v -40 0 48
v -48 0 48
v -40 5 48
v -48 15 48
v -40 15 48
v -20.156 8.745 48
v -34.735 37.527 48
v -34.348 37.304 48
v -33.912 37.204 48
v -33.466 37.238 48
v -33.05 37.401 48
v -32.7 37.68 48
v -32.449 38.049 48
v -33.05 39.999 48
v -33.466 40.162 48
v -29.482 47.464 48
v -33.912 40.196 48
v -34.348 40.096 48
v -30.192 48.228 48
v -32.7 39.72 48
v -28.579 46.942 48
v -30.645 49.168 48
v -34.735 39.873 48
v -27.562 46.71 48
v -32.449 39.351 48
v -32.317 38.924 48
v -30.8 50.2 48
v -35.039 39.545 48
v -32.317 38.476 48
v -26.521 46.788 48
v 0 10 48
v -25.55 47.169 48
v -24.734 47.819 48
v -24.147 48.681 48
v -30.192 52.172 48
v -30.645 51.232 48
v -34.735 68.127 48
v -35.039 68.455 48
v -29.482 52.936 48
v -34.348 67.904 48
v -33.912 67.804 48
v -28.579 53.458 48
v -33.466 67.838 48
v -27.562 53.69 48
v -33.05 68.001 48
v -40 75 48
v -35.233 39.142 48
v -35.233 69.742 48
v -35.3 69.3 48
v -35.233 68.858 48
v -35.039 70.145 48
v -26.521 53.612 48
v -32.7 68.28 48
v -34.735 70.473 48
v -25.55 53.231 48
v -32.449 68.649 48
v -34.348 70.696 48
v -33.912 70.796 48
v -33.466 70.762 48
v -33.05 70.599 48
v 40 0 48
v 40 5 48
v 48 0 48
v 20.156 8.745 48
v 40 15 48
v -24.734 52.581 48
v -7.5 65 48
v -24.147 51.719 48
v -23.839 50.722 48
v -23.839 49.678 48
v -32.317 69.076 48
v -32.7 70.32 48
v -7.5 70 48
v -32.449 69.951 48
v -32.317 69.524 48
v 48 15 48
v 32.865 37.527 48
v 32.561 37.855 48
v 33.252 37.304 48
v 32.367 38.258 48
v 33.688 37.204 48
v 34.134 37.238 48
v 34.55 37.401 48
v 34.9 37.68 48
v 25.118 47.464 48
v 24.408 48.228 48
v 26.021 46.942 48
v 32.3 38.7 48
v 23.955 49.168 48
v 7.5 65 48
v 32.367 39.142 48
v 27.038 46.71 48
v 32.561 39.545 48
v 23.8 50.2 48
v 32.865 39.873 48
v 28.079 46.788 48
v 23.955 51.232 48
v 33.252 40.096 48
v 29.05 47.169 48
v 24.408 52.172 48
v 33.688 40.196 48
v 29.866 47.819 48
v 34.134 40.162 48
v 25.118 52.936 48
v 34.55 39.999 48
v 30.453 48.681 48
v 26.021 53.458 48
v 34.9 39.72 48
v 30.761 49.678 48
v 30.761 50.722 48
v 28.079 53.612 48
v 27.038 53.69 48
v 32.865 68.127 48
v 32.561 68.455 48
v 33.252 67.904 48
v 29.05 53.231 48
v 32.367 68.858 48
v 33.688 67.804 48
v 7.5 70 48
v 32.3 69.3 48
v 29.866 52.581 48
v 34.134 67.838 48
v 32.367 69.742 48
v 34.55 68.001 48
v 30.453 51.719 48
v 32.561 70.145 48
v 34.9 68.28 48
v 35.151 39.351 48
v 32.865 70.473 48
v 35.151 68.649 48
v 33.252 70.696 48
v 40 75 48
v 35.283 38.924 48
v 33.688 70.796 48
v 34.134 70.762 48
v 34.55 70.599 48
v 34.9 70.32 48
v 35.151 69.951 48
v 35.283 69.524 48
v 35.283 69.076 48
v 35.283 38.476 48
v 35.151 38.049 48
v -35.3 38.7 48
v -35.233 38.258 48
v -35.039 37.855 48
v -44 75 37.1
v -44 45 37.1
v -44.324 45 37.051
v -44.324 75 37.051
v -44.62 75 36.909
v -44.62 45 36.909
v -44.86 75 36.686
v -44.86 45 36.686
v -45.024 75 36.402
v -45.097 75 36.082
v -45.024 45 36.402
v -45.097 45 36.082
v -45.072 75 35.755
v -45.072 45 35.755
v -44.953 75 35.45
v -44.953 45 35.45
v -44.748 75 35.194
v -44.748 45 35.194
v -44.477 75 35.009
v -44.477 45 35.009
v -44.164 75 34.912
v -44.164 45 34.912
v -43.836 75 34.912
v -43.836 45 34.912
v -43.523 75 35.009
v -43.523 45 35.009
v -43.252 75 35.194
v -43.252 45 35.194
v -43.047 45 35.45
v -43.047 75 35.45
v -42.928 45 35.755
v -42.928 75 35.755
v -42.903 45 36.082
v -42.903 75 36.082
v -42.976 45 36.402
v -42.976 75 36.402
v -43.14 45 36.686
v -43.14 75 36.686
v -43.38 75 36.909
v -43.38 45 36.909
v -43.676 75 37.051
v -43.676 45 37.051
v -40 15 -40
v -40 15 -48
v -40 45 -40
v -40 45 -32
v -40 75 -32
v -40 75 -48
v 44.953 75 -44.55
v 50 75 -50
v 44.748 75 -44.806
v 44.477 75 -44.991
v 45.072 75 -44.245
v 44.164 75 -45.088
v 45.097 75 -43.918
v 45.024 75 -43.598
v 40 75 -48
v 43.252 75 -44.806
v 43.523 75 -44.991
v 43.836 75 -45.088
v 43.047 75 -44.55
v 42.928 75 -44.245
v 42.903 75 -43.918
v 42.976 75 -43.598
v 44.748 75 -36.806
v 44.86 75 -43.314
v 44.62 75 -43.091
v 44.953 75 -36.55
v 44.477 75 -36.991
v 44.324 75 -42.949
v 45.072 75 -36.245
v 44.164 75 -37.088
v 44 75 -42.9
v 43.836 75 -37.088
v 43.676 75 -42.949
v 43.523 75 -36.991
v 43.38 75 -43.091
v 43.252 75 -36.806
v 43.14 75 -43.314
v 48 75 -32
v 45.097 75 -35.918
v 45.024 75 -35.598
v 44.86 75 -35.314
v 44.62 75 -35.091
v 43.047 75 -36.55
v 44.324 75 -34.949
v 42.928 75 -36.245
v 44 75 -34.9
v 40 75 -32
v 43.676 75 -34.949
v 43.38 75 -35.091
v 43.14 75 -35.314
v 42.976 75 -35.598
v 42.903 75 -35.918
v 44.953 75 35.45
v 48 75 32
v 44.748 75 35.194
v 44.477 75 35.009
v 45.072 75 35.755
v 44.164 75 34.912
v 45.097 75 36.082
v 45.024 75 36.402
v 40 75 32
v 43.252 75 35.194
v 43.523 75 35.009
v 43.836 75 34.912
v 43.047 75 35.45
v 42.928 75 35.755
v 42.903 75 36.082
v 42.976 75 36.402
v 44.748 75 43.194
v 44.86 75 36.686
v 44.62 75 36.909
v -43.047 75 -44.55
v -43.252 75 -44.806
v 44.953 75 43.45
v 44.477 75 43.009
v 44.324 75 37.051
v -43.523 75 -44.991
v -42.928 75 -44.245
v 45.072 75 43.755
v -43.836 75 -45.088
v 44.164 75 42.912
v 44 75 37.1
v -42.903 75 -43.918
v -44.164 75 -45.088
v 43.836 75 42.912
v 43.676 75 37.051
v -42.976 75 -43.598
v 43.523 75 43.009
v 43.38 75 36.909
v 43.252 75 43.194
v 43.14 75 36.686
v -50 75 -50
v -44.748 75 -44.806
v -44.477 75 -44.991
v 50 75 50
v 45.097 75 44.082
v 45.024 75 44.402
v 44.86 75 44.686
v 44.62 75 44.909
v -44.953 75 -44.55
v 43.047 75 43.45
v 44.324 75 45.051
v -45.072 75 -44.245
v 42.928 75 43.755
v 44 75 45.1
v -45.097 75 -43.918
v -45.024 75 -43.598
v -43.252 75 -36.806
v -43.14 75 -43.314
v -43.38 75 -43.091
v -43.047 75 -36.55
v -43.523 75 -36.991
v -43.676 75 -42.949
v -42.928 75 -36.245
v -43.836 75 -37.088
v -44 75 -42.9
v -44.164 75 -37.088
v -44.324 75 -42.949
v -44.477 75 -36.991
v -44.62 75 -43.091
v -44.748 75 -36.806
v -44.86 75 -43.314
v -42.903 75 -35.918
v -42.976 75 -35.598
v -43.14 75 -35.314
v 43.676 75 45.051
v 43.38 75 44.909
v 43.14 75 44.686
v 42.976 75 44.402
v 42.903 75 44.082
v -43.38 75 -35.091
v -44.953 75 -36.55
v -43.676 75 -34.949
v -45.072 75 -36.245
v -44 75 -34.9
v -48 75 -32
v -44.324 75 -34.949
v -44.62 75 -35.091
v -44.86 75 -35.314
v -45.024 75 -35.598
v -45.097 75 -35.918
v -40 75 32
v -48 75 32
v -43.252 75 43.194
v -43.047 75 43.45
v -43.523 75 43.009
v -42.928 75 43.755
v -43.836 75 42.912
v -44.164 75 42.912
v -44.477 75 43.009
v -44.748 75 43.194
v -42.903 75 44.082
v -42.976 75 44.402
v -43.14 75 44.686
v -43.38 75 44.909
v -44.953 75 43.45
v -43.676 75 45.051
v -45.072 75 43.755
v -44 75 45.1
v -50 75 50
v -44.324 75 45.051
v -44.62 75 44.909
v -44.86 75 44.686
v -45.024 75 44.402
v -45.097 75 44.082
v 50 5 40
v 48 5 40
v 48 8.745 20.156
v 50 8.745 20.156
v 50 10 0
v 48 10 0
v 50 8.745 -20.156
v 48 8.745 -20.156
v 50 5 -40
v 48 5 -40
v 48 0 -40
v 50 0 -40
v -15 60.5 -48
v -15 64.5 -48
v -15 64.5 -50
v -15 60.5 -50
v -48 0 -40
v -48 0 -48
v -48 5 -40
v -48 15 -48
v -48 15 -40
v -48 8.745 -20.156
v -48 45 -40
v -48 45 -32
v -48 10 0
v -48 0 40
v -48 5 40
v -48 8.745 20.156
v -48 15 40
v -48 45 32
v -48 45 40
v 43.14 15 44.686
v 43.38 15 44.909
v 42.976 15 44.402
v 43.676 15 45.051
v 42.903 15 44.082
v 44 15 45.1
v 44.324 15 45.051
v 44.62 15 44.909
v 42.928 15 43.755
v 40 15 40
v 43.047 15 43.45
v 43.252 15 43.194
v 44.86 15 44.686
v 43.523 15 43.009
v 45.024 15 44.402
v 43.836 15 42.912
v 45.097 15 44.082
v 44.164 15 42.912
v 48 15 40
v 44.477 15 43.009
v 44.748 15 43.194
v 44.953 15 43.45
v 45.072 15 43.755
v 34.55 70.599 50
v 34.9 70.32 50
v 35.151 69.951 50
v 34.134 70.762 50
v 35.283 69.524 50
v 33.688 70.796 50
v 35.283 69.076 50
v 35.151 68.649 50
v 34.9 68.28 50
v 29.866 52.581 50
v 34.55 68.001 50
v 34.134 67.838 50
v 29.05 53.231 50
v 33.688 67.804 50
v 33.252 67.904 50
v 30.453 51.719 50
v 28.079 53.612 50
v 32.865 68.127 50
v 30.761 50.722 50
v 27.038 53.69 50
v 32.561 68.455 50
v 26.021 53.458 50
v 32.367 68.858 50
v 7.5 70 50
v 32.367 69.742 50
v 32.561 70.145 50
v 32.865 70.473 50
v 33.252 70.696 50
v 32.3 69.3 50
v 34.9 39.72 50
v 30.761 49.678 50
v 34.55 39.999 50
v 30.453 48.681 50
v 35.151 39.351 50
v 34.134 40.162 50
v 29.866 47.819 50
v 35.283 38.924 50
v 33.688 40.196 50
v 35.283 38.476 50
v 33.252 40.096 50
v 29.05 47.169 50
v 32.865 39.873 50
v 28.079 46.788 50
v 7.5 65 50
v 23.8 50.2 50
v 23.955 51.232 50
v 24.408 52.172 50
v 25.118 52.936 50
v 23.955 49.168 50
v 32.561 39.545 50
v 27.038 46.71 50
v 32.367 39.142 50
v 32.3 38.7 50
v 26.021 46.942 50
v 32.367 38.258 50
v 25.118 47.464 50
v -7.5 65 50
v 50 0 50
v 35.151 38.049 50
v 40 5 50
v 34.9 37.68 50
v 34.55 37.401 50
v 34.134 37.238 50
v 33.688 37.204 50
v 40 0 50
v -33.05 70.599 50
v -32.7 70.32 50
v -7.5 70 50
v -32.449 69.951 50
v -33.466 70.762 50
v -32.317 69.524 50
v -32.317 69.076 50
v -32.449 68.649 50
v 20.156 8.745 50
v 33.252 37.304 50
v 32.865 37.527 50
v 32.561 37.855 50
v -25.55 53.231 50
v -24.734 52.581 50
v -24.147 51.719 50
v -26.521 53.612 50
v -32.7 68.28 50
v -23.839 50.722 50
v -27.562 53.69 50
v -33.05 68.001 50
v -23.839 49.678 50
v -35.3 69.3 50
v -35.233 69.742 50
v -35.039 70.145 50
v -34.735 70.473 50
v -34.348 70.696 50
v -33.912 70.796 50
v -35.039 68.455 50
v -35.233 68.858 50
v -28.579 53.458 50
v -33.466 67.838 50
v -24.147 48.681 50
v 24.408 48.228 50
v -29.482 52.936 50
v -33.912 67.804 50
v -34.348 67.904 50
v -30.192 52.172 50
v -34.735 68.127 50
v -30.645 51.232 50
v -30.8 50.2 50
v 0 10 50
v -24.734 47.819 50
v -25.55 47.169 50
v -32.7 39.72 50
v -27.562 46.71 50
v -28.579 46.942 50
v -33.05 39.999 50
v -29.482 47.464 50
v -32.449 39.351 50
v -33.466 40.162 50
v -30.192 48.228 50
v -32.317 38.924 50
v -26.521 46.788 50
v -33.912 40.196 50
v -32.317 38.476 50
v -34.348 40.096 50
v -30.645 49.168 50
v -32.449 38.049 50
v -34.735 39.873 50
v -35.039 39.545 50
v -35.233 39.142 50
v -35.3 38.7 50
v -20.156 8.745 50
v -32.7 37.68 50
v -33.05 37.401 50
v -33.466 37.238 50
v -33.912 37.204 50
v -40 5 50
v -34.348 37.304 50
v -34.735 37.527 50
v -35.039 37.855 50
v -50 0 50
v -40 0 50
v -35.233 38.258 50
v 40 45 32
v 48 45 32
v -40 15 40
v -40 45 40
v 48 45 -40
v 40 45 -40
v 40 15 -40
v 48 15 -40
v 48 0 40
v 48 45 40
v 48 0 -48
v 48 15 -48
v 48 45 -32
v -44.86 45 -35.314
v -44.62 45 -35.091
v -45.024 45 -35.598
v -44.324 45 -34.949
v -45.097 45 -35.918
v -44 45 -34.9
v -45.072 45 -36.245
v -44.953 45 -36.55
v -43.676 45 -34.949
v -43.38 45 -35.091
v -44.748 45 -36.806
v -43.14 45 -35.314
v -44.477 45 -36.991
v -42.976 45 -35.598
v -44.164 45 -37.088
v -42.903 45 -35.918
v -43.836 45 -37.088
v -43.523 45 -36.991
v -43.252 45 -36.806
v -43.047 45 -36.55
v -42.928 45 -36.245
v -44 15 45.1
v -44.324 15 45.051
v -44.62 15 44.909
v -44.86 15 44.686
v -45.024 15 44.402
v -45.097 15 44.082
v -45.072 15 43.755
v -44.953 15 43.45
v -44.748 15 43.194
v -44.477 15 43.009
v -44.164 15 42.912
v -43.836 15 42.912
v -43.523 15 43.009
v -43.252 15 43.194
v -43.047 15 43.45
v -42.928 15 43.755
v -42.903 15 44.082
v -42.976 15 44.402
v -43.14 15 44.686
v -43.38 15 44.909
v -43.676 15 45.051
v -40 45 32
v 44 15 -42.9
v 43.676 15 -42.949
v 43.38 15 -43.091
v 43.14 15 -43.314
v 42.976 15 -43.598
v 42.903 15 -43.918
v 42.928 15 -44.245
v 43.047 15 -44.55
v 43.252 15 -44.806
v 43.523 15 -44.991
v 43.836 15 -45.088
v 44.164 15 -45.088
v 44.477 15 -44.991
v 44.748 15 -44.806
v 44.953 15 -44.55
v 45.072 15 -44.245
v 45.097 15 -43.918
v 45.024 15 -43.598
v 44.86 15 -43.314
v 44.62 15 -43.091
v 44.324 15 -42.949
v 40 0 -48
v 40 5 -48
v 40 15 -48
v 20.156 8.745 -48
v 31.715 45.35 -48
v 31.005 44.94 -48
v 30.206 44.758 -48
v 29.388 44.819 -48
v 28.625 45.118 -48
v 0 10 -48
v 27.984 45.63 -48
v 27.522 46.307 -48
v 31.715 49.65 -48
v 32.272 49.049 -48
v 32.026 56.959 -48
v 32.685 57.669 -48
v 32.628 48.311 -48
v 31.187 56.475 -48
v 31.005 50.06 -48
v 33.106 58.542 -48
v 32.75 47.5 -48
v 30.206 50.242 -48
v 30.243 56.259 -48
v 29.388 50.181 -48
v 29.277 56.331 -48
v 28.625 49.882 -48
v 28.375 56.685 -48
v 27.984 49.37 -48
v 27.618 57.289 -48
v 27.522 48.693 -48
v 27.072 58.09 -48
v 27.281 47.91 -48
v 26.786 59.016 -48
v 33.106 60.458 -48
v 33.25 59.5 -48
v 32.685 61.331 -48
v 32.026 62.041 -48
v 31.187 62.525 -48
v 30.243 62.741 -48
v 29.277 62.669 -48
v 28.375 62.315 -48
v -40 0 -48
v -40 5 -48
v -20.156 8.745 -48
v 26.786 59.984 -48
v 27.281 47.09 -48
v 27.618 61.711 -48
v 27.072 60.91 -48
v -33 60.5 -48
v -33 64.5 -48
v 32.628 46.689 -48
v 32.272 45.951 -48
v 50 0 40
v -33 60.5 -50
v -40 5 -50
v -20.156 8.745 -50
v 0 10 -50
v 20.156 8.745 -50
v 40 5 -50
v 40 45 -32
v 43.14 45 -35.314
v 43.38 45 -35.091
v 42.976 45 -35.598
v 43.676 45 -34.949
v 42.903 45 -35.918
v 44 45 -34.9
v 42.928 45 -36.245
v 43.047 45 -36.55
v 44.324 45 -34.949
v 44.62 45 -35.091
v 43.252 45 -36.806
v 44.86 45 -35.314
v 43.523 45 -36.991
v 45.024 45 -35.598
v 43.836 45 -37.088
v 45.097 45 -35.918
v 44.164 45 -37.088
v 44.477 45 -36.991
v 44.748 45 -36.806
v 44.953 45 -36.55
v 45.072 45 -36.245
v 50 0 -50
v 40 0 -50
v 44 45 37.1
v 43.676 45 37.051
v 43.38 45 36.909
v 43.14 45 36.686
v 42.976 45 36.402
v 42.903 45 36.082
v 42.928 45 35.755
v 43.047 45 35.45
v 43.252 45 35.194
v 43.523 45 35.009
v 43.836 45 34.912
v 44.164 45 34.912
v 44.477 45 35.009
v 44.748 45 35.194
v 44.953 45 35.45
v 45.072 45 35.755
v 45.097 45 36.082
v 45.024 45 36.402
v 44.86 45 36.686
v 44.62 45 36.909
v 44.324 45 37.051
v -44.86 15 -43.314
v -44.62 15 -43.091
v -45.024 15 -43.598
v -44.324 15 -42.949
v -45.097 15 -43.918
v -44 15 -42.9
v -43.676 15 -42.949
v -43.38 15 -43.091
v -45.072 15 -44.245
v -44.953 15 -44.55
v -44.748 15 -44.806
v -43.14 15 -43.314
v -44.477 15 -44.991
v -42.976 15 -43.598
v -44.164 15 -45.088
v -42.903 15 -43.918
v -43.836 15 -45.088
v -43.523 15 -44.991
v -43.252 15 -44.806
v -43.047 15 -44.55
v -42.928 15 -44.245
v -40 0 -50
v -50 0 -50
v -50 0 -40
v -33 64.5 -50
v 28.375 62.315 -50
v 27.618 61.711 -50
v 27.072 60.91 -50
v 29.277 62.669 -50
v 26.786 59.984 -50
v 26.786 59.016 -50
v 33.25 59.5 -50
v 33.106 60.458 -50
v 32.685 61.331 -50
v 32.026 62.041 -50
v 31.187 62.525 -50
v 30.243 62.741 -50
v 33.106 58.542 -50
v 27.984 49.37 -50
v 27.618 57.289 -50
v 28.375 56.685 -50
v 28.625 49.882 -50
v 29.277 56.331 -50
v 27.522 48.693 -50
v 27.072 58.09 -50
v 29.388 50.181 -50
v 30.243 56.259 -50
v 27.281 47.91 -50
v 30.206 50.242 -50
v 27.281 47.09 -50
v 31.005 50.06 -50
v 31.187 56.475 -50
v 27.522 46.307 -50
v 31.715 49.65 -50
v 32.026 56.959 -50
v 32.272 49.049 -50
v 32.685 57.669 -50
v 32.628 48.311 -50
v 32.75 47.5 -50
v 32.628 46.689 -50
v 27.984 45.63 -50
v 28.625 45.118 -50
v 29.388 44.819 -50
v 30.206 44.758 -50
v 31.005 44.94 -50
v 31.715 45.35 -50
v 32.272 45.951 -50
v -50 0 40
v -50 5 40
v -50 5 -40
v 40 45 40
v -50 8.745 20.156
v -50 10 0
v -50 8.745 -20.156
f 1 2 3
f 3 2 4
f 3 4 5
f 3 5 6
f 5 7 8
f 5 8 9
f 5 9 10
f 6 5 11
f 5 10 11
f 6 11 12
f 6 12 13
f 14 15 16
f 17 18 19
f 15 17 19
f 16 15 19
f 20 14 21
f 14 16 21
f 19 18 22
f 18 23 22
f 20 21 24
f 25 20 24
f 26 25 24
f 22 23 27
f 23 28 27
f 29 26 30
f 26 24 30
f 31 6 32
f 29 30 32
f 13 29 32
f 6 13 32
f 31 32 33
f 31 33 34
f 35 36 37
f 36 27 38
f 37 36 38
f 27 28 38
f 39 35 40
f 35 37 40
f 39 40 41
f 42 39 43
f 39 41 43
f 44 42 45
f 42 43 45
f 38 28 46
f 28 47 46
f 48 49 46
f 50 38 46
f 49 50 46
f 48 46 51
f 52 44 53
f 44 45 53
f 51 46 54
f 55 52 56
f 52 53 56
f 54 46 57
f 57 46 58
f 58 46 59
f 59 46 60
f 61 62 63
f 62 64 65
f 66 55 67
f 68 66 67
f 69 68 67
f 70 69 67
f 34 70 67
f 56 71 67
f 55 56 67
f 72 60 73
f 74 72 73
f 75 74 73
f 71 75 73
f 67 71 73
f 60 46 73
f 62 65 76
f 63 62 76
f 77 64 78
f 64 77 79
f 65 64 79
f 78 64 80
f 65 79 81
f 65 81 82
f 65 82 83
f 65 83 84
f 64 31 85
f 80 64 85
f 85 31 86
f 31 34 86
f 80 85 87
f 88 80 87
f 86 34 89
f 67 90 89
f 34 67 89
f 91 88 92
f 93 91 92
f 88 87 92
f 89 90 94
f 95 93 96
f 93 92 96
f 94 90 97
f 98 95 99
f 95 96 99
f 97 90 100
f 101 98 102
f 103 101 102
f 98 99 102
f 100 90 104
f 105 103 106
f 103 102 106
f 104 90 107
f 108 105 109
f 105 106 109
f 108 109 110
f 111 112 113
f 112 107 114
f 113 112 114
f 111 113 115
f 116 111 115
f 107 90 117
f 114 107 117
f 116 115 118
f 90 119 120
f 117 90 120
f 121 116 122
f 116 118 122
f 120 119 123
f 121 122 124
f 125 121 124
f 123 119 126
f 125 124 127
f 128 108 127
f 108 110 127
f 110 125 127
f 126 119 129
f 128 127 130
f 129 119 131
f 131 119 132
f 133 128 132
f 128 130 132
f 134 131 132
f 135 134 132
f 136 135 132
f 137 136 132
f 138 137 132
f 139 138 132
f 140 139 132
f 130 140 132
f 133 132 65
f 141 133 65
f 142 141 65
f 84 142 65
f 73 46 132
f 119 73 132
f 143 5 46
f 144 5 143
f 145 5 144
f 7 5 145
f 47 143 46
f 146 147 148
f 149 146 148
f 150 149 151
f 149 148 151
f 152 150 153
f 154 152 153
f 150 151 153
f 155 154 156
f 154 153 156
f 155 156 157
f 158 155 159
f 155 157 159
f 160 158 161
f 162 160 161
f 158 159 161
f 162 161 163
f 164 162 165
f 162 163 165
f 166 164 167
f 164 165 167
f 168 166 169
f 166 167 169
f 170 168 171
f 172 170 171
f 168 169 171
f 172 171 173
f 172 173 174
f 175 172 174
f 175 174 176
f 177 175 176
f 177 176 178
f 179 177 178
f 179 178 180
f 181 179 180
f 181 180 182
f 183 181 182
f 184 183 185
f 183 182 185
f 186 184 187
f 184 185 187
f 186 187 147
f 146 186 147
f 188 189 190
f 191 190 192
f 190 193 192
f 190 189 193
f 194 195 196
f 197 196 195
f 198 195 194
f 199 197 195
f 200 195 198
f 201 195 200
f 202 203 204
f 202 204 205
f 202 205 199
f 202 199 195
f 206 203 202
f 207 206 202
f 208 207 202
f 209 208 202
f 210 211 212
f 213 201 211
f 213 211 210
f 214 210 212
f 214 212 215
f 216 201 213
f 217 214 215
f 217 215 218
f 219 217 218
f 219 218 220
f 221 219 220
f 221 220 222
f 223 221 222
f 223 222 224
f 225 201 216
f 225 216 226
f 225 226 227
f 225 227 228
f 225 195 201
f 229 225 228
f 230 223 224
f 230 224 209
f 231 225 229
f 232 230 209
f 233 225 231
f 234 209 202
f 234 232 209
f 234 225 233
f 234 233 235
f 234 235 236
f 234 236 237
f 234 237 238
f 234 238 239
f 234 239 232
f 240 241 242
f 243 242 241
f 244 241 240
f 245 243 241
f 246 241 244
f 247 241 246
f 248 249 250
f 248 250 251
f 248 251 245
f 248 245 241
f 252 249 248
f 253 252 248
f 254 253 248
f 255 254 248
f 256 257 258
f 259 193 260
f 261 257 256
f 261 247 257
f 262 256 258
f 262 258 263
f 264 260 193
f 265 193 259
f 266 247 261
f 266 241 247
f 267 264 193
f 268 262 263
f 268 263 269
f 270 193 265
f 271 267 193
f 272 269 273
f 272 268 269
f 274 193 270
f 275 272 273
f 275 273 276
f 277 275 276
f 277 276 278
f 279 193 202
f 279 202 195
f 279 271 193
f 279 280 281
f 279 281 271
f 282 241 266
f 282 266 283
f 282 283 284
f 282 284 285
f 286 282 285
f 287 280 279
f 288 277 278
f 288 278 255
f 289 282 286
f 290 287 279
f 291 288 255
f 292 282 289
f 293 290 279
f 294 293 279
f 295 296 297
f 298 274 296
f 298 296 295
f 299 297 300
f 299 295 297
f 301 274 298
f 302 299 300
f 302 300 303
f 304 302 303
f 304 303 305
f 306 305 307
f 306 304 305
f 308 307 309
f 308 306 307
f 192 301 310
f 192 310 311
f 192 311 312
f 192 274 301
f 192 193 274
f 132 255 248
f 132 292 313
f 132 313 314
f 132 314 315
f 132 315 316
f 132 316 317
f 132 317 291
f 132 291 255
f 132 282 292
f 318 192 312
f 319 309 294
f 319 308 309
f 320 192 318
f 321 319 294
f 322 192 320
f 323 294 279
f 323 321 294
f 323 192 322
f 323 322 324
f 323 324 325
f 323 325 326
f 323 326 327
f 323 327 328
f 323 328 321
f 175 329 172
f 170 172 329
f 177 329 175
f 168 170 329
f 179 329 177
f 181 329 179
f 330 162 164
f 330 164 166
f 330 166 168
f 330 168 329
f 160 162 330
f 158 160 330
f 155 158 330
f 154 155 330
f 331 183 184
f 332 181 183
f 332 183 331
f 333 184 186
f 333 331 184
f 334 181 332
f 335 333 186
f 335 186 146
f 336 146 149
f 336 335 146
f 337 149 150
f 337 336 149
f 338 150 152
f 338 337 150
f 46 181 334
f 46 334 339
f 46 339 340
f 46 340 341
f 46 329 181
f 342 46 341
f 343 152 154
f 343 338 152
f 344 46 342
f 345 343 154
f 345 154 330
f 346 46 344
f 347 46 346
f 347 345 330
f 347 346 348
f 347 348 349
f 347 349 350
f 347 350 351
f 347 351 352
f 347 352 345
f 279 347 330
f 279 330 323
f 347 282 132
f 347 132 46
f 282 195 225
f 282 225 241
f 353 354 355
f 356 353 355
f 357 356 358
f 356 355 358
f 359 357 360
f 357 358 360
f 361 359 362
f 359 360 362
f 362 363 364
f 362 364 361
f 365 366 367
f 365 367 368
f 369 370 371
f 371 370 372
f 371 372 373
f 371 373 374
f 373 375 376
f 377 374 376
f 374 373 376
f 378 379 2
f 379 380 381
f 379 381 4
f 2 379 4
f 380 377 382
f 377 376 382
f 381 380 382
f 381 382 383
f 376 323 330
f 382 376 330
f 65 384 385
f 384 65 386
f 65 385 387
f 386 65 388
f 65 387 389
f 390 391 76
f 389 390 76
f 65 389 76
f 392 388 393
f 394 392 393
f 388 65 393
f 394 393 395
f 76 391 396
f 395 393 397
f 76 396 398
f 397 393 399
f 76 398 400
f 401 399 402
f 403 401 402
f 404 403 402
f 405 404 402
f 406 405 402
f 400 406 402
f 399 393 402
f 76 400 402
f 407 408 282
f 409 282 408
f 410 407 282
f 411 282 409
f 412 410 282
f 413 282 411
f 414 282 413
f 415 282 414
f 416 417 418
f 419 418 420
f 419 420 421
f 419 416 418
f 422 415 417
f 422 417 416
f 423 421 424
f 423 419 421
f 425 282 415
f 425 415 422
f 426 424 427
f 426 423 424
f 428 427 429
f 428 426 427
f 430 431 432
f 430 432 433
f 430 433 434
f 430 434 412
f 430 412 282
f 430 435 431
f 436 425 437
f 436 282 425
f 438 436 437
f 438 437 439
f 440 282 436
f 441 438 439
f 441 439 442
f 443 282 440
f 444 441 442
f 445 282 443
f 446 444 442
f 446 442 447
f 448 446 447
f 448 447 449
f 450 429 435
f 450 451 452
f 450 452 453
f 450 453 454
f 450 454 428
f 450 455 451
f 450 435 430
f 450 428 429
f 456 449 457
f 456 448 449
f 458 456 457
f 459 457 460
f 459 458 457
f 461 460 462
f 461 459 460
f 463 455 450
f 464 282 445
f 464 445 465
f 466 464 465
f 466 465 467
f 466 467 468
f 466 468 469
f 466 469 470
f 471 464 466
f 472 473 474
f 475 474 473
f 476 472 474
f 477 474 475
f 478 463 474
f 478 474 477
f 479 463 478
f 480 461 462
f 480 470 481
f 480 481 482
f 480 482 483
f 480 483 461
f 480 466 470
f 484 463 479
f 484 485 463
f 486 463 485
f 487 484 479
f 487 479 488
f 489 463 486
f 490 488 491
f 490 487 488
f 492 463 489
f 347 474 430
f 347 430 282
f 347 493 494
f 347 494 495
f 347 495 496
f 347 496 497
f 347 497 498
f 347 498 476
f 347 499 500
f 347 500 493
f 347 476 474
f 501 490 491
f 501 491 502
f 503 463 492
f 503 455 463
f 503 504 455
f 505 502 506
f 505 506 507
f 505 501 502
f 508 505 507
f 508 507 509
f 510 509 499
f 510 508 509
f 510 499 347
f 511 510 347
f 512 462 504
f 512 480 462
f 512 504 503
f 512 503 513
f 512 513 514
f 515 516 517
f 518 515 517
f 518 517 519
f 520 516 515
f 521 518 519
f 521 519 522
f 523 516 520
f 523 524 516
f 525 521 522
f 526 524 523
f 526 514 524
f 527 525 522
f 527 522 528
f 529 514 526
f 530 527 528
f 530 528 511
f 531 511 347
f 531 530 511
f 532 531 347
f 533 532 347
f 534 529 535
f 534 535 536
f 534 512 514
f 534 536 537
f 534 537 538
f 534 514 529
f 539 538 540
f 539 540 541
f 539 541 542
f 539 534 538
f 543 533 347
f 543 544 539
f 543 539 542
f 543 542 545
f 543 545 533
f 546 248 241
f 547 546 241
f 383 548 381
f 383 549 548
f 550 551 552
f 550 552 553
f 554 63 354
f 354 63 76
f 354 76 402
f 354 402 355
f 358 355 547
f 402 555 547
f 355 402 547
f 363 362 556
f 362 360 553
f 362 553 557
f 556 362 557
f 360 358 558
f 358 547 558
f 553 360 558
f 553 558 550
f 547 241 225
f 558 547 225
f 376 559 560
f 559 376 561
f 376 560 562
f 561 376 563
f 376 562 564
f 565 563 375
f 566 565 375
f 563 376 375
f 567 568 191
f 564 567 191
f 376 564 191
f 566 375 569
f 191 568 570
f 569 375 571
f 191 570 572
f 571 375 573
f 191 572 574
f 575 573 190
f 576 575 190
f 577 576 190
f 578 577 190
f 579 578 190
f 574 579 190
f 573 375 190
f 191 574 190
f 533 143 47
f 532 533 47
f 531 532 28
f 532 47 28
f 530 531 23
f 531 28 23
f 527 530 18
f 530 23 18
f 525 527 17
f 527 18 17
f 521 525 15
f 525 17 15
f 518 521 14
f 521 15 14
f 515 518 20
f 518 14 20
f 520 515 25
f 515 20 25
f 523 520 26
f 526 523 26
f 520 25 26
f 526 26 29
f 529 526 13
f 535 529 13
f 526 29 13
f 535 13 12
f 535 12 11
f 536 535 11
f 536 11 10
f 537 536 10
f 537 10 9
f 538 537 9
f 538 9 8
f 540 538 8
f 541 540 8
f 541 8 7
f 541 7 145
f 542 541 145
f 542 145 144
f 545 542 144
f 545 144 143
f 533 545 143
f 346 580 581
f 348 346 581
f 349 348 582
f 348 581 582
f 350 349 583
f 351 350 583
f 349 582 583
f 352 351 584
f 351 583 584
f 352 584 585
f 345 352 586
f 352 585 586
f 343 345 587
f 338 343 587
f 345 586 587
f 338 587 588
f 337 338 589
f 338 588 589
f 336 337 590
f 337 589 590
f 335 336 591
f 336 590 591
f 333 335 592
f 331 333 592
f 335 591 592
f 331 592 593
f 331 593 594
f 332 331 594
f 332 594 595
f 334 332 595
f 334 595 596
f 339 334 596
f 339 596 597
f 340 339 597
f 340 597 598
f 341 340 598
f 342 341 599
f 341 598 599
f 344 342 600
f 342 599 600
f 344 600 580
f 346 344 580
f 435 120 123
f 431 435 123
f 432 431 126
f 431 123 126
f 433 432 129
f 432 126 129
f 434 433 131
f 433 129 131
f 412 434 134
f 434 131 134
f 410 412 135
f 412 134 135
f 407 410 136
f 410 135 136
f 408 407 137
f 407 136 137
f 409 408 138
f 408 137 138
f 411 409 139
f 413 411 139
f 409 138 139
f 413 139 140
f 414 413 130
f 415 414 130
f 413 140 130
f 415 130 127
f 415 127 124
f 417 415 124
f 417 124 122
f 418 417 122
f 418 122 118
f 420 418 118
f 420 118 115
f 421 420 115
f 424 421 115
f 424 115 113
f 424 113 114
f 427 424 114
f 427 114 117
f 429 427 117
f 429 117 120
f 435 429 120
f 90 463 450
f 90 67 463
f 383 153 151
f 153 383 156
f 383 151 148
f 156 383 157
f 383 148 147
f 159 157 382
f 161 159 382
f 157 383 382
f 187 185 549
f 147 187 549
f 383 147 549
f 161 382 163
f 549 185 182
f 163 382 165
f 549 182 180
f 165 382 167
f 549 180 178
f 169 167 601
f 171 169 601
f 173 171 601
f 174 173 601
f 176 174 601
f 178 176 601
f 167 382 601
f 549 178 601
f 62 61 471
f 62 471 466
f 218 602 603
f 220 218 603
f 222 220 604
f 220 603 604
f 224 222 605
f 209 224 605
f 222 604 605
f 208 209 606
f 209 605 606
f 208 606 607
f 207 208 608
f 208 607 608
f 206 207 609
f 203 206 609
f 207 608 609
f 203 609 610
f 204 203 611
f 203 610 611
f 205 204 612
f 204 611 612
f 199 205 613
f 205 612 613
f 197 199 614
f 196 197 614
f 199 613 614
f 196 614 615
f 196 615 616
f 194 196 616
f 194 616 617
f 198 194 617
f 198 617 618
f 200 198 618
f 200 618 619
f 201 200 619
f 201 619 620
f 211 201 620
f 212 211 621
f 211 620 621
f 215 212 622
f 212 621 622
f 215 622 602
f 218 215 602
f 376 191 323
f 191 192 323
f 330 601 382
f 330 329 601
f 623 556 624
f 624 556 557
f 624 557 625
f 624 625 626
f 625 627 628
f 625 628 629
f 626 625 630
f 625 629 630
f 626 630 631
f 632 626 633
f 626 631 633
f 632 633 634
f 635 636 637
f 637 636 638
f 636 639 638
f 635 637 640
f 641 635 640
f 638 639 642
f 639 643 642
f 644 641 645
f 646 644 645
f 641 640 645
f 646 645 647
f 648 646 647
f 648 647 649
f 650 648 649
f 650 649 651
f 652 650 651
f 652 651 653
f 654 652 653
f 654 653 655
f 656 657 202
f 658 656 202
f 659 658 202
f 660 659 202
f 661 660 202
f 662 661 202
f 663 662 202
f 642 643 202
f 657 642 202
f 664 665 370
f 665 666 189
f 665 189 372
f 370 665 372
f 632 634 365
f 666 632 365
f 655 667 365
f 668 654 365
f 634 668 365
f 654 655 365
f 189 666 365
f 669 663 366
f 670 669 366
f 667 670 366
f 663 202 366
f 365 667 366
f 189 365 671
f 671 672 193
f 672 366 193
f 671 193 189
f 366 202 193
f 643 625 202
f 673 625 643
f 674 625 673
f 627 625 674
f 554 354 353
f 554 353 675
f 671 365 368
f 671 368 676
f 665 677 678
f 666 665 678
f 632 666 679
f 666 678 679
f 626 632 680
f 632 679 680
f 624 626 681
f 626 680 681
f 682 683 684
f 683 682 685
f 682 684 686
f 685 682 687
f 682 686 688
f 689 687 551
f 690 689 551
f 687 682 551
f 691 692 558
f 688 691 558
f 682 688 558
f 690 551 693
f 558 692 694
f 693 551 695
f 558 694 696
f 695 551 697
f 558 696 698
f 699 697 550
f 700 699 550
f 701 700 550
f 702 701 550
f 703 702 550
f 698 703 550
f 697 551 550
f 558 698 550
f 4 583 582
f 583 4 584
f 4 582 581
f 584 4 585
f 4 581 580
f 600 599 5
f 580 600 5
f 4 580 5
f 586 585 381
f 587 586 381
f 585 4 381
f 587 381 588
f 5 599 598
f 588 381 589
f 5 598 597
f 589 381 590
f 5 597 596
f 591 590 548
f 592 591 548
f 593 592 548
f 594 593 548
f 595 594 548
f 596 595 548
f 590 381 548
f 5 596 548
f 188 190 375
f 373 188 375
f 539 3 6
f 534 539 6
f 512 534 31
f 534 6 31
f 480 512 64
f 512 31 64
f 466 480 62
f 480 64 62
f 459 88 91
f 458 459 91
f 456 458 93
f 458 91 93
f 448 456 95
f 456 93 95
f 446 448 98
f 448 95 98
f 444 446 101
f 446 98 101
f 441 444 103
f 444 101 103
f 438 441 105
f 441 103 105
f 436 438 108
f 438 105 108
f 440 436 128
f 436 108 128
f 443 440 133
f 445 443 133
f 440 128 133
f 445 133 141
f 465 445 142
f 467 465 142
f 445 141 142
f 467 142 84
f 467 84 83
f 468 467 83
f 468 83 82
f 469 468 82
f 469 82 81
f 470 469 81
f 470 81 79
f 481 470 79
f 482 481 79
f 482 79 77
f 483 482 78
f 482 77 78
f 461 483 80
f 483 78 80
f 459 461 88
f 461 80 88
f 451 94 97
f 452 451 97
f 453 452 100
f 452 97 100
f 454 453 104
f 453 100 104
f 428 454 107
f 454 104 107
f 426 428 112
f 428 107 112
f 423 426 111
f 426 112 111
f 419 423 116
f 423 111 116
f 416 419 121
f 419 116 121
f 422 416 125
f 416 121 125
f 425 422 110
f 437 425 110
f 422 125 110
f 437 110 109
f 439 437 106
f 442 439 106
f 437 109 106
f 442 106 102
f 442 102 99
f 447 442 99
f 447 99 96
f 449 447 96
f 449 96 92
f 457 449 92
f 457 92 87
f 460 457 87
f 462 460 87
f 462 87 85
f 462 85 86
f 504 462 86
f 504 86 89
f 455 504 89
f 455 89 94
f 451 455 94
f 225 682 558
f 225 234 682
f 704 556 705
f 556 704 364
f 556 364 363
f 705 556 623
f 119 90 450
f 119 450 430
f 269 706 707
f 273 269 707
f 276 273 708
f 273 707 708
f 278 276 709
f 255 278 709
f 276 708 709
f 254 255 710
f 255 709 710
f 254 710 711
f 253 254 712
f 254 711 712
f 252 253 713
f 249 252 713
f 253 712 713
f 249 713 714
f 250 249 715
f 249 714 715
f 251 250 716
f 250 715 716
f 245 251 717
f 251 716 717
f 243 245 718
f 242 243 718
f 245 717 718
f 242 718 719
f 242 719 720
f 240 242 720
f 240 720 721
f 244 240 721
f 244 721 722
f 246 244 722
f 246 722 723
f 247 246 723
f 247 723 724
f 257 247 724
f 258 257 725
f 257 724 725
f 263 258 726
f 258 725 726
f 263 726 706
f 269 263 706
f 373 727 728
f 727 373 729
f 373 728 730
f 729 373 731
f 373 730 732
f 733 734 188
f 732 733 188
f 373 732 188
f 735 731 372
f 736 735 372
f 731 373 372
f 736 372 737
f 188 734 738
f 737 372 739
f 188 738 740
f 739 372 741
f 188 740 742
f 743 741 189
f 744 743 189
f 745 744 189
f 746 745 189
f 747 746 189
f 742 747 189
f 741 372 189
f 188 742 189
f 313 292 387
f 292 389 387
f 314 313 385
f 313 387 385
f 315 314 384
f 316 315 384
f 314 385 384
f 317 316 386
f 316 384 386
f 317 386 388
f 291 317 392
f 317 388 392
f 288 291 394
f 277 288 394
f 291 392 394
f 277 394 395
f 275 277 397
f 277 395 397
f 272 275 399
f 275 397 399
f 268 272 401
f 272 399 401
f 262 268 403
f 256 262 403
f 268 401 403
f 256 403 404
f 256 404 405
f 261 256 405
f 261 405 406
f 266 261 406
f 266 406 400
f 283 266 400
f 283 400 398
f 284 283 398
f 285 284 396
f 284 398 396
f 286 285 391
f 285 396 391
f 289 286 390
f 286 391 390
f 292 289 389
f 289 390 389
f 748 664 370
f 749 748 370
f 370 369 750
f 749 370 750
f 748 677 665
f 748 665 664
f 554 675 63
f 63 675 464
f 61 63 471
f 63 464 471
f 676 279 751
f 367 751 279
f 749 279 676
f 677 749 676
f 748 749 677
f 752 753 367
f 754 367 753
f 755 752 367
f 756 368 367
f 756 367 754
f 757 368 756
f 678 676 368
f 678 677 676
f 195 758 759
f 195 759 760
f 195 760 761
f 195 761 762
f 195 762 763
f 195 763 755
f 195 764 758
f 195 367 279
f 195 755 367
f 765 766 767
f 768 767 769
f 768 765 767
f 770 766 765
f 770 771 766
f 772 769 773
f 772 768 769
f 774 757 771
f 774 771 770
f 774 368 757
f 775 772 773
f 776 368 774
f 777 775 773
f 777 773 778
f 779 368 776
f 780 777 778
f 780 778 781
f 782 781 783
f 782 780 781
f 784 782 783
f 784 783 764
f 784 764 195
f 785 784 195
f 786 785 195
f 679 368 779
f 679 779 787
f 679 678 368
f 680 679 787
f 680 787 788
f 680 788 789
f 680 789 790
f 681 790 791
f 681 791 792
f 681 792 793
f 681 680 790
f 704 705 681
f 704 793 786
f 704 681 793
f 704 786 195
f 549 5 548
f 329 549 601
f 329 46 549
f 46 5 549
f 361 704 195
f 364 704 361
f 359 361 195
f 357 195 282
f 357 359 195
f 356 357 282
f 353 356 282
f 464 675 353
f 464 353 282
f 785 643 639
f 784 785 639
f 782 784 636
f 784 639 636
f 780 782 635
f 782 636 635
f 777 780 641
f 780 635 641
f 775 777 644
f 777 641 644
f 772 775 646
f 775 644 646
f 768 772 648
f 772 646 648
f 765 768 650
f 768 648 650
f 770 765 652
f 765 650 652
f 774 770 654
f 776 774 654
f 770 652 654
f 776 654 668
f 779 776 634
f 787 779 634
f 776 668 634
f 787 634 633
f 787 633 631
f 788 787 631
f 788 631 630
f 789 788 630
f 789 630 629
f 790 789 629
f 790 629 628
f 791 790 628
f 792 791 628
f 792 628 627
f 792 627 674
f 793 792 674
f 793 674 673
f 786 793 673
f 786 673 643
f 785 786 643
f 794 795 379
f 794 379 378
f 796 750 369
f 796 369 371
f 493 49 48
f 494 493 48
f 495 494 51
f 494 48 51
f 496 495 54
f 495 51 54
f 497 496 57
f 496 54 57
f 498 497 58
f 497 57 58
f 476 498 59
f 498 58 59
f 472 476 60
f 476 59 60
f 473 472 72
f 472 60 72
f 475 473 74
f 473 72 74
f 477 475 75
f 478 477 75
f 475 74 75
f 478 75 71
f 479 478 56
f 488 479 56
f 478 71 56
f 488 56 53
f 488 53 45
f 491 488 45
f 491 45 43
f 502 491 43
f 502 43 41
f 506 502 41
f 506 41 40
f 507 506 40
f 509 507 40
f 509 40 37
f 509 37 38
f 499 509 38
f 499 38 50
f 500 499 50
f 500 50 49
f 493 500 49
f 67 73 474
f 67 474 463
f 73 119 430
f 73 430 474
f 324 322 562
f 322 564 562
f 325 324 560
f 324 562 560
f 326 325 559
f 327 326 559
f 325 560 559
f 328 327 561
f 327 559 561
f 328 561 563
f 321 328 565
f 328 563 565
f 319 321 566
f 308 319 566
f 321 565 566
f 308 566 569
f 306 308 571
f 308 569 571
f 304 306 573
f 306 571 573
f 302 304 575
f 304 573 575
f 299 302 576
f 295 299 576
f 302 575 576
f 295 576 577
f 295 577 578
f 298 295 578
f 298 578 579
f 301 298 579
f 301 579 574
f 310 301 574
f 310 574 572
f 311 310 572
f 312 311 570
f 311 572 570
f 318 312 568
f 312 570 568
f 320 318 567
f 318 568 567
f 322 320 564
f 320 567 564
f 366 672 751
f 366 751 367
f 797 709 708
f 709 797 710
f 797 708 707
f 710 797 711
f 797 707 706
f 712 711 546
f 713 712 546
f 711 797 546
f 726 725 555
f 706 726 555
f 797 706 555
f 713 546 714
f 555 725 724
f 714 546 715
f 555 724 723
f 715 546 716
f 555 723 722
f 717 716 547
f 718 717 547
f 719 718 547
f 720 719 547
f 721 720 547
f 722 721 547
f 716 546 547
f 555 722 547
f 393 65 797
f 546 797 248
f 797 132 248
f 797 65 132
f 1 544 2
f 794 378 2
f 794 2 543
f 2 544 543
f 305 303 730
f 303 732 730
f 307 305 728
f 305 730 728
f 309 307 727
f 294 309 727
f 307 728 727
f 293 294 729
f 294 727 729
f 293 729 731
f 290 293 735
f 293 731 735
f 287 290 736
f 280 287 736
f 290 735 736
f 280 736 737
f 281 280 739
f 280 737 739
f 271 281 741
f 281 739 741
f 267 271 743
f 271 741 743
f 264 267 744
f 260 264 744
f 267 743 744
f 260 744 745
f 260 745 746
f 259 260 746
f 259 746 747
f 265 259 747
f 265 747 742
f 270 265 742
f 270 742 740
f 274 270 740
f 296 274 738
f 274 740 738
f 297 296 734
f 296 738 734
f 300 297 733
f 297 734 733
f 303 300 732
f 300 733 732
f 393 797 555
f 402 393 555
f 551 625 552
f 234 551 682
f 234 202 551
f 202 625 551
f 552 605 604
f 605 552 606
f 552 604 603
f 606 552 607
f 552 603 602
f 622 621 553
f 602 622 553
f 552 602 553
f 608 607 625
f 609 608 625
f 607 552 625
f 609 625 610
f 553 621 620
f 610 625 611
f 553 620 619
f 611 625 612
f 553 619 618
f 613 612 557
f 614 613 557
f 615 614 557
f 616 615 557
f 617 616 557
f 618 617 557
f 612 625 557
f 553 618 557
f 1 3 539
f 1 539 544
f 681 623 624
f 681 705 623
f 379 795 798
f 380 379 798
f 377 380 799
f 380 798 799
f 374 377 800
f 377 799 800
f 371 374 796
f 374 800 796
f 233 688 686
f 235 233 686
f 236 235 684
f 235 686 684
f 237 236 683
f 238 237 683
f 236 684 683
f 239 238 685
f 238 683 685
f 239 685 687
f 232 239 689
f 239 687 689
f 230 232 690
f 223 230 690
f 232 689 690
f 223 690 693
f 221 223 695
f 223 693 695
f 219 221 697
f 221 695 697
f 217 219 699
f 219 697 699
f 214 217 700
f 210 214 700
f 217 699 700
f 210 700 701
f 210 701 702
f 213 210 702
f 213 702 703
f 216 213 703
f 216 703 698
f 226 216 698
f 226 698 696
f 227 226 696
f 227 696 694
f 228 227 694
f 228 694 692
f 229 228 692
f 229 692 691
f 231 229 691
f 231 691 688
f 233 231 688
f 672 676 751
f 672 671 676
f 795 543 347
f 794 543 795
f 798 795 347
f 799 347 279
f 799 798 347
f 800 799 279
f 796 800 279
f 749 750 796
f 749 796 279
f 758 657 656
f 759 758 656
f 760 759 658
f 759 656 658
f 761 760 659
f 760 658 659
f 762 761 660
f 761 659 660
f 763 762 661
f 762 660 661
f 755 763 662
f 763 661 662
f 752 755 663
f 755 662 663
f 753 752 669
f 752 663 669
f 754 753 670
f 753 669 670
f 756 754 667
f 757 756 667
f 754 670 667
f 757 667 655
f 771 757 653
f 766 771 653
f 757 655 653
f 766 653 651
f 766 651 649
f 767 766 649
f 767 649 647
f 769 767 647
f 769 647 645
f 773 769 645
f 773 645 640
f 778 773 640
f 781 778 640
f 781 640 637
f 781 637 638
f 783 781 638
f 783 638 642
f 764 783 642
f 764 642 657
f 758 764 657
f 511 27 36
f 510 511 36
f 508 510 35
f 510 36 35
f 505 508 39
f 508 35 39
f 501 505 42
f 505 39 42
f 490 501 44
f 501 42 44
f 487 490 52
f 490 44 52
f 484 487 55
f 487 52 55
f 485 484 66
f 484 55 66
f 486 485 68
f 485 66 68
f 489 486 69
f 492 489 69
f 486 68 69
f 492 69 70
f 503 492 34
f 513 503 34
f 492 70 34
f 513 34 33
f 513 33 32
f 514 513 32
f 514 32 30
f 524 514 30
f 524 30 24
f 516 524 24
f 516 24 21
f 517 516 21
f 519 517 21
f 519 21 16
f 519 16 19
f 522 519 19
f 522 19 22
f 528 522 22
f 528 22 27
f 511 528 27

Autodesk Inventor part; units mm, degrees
ref_plane "YZ Plane" through (0, 0, 0) normal (1, 0, 0) x (0, 1, 0)
ref_plane "XZ Plane" through (0, 0, 0) normal (0, 1, 0) x (-1, 0, 0)
ref_plane "XY Plane" through (0, 0, 0) normal (0, 0, 1) x (1, 0, 0)
sketch "Skizze1" plane through (0, 0, 0) normal (0, 1, 0) x (-1, 0, 0)
  line L0 (-50, 50) -> (50, 50)
  line L1 (50, 50) -> (50, -50)
  line L2 (50, -50) -> (-50, -50)
  line L3 (-50, -50) -> (-50, 50)
  line L4 (-50, 50) -> (50, -50) construction
  line L5 (50, 50) -> (-50, -50) construction
  point P0 (0, 0)
  dimension "d0" = 100
  dimension "d1" = 100
extrude "Extrusion1" add sketch "Skizze1" along normal blind 75
sketch "Skizze2" plane through (0, 0, 0) normal (1, 0, 0) x (0, 1, 0)
  line L0 (5, 40) -> (0, 40)
  line L1 (0, 40) -> (0, -40)
  line L2 (0, -40) -> (5, -40)
  arc A0 (5, -40) -> (5, 40) centre (-152.5, 0) ccw
  point P0 (0, 0)
  point P1 (0, 0)
  dimension "d4" = 5
  dimension "d6" = 80
  dimension "d30" = 10
extrude "Extrusion2" cut sketch "Skizze2" along normal through all both and the other way through all
sketch "Skizze3" plane through (0, 0, 0) normal (0, 0, 1) x (1, 0, 0)
  line L0 (-40, 5) -> (-40, 0)
  line L1 (-40, 0) -> (40, 0)
  line L2 (40, 0) -> (40, 5)
  arc A0 (40, 5) -> (-40, 5) centre (0, -152.5) ccw
  point P0 (0, 0)
  point P1 (0, 0)
  point P2 (0, 0)
  dimension "d9" = 5
  dimension "d11" = 80
  dimension "d29" = 10
extrude "Extrusion3" cut sketch "Skizze3" along normal through all both and the other way through all
sketch "Skizze9" plane through (0, 75, 0) normal (0, 1, 0) x (1, 0, 0)
  line L0 (-50, -50) -> (50, -50) projected
  line L1 (50, -50) -> (50, 50) projected
  line L2 (50, 50) -> (-50, 50) projected
  line L3 (-50, 50) -> (-50, -50) projected
  line L4 (-48, -48) -> (48, -48)
  line L5 (48, -48) -> (48, 48)
  line L6 (48, 48) -> (-48, 48)
  line L7 (-48, 48) -> (-48, -48)
  line L8 (-40, 40) -> (-48, 40)
  line L9 (-48, 40) -> (-48, 48)
  line L10 (-48, 48) -> (-40, 48)
  line L11 (-40, 48) -> (-40, 40)
  line L12 (-40, 40) -> (-48, 48) construction
  line L13 (-48, 40) -> (-40, 48) construction
  line L14 (40, 40) -> (48, 40)
  line L15 (48, 40) -> (48, 48)
  line L16 (48, 48) -> (40, 48)
  line L17 (40, 48) -> (40, 40)
  line L18 (40, 40) -> (48, 48) construction
  line L19 (48, 40) -> (40, 48) construction
  line L20 (40, -40) -> (48, -40)
  line L21 (48, -40) -> (48, -48)
  line L22 (48, -48) -> (40, -48)
  line L23 (40, -48) -> (40, -40)
  line L24 (40, -40) -> (48, -48) construction
  line L25 (48, -40) -> (40, -48) construction
  line L26 (40, -32) -> (48, -32)
  line L27 (48, -32) -> (48, -40)
  line L28 (48, -40) -> (40, -40)
  line L29 (40, -40) -> (40, -32)
  line L30 (40, -32) -> (48, -40) construction
  line L31 (48, -32) -> (40, -40) construction
  line L32 (-40, 32) -> (-48, 32)
  line L33 (-48, 32) -> (-48, 40)
  line L34 (-48, 40) -> (-40, 40)
  line L35 (-40, 40) -> (-40, 32)
  line L36 (-40, 32) -> (-48, 40) construction
  line L37 (-48, 32) -> (-40, 40) construction
  line L38 (40, 32) -> (48, 32)
  line L39 (48, 32) -> (48, 40)
  line L40 (48, 40) -> (40, 40)
  line L41 (40, 40) -> (40, 32)
  line L42 (40, 32) -> (48, 40) construction
  line L43 (48, 32) -> (40, 40) construction
  line L44 (-40, -40) -> (-48, -40)
  line L45 (-48, -40) -> (-48, -48)
  line L46 (-48, -48) -> (-40, -48)
  line L47 (-40, -48) -> (-40, -40)
  line L48 (-40, -40) -> (-48, -48) construction
  line L49 (-48, -40) -> (-40, -48) construction
  line L50 (-40, -32) -> (-48, -32)
  line L51 (-48, -32) -> (-48, -40)
  line L52 (-48, -40) -> (-40, -40)
  line L53 (-40, -40) -> (-40, -32)
  line L54 (-40, -32) -> (-48, -40) construction
  line L55 (-48, -32) -> (-40, -40) construction
  point P0 (0, 0)
  point P1 (-44, 44)
  point P2 (44, 44)
  point P3 (44, -44)
  point P4 (44, -36)
  point P5 (-44, 36)
  point P6 (44, 36)
  point P7 (-44, -44)
  point P8 (-44, -36)
  point P9 (-44, 44)
  point P10 (-44, 36)
  point P11 (44, 44)
  point P12 (44, 36)
  point P13 (-44, -36)
  point P14 (-44, -44)
  point P15 (44, -36)
  point P16 (44, -44)
  dimension "d65" = 2
  dimension "d81" = 8
  dimension "d82" = 8
extrude "Extrusion9" cut sketch "Skizze9" against normal through all contours L7 L44 L47 L4 | L47 L53 L50 L7 L32 L35 L11 L6 L17 L41 L38 L5 L26 L29 L23 L4 | L7 L50 L53 L44 | L23 L20 L5 L4 | L29 L26 L5 L20 | L7 L8 L35 L32 | L7 L6 L11 L8 | L38 L41 L14 L5 | L14 L17 L6 L5
extrude "Extrusion10" add sketch "Skizze9" against normal blind 60 contours L7 L44 L47 L4 | L23 L20 L5 L4 | L7 L6 L11 L8 | L14 L17 L6 L5
extrude "Extrusion11" add sketch "Skizze9" against normal blind 30 contours L7 L50 L53 L44 | L29 L26 L5 L20 | L7 L8 L35 L32 | L38 L41 L14 L5
hole "Bohrung3" at (-44, 75, 44) at (-44, 75, 36) at (-44, 75, -36) at (-44, 75, -44) at (44, 75, -44) at (44, 75, -36) at (44, 75, 36) at (44, 75, 44) direction (0, -1, 0) diameter 2.2 end through all
sketch "Skizze10" plane through (0, -152.5, -48) normal (0, 0, 1) x (1, 0, 0)
  line L0 (-40, 227.5) -> (40, 227.5) projected
  circle A0 centre (30, 212) radius 3.25
  circle A1 centre (30, 200) radius 2.75
  line L1 (-33, 217) -> (-15, 217)
  line L2 (-15, 217) -> (-15, 213)
  line L3 (-15, 213) -> (-33, 213)
  line L4 (-33, 213) -> (-33, 217)
  line L5 (-33, 217) -> (-15, 213) construction
  line L6 (-15, 217) -> (-33, 213) construction
  line L7 (-48, 227.5) -> (-40, 227.5) projected
  line L8 (-48, 197.5) -> (-48, 227.5) projected
  line L9 (-40, 197.5) -> (-48, 197.5) projected
  line L10 (-40, 227.5) -> (-40, 197.5) projected
  line L11 (40, 227.5) -> (48, 227.5) projected
  line L12 (40, 227.5) -> (40, 197.5) projected
  line L13 (48, 197.5) -> (40, 197.5) projected
  line L14 (48, 227.5) -> (48, 197.5) projected
  point P0 (0, 152.5)
  point P1 (-24, 215)
  dimension "d83" = 6.5
  dimension "d84" = 15.5
  dimension "d85" = 18
  dimension "d86" = 5.5
  dimension "d87" = 2.5
  dimension "d89" = 15
  dimension "d90" = 18
  dimension "d91" = 4
  dimension "d92" = 15.5
extrude "Extrusion12" cut sketch "Skizze10" against normal up to surface (2 mm away) contours A0 | A1 | L1 L2 L3 L4
sketch "Skizze8" plane through (0, -142.5, 48) normal (0, 0, -1) x (-1, 0, 0)
  line L0 (-40, 217.5) -> (40, 217.5) projected
  line L1 (-7.5, 212.5) -> (7.5, 212.5)
  line L2 (7.5, 212.5) -> (7.5, 207.5)
  line L3 (7.5, 207.5) -> (-7.5, 207.5)
  line L4 (-7.5, 207.5) -> (-7.5, 212.5)
  circle A0 centre (27.3, 192.7) radius 3.4544 projected
  circle A1 centre (-27.3, 192.7) radius 3.5
  circle A2 centre (27.3, 192.7) radius 3.5
  circle A3 centre (-27.3, 192.7) radius 3.4544 projected
  circle A4 centre (-33.8, 211.8) radius 1.1 projected
  circle A5 centre (-33.8, 181.2) radius 1.1 projected
  circle A6 centre (33.8, 211.8) radius 1.1 projected
  circle A7 centre (33.8, 181.2) radius 1.1 projected
  circle A8 centre (-33.8, 211.8) radius 1.5
  circle A9 centre (33.8, 211.8) radius 1.5
  circle A10 centre (33.8, 181.2) radius 1.5
  circle A11 centre (-33.8, 181.2) radius 1.5
  point P0 (0, 152.5)
  point P1 (0, 212.5)
  point P2 (0, 217.5)
  point P3 (-40, 147.5)
  point P4 (40, 147.5)
  dimension "d57" = 15
  dimension "d58" = 5
  dimension "d59" = 5
  dimension "d60" = 7
  dimension "d61" = 7
  dimension "d64" = 3
extrude "Extrusion8" cut sketch "Skizze8" against normal up to surface (2 mm away) contours L1 L2 L3 L4 | A0 | A1 | A2 | A3 | A4 | A5 | A6 | A7 | A8 | A9 | A10 | A11
properties part number "DayLightGlow_Base"
